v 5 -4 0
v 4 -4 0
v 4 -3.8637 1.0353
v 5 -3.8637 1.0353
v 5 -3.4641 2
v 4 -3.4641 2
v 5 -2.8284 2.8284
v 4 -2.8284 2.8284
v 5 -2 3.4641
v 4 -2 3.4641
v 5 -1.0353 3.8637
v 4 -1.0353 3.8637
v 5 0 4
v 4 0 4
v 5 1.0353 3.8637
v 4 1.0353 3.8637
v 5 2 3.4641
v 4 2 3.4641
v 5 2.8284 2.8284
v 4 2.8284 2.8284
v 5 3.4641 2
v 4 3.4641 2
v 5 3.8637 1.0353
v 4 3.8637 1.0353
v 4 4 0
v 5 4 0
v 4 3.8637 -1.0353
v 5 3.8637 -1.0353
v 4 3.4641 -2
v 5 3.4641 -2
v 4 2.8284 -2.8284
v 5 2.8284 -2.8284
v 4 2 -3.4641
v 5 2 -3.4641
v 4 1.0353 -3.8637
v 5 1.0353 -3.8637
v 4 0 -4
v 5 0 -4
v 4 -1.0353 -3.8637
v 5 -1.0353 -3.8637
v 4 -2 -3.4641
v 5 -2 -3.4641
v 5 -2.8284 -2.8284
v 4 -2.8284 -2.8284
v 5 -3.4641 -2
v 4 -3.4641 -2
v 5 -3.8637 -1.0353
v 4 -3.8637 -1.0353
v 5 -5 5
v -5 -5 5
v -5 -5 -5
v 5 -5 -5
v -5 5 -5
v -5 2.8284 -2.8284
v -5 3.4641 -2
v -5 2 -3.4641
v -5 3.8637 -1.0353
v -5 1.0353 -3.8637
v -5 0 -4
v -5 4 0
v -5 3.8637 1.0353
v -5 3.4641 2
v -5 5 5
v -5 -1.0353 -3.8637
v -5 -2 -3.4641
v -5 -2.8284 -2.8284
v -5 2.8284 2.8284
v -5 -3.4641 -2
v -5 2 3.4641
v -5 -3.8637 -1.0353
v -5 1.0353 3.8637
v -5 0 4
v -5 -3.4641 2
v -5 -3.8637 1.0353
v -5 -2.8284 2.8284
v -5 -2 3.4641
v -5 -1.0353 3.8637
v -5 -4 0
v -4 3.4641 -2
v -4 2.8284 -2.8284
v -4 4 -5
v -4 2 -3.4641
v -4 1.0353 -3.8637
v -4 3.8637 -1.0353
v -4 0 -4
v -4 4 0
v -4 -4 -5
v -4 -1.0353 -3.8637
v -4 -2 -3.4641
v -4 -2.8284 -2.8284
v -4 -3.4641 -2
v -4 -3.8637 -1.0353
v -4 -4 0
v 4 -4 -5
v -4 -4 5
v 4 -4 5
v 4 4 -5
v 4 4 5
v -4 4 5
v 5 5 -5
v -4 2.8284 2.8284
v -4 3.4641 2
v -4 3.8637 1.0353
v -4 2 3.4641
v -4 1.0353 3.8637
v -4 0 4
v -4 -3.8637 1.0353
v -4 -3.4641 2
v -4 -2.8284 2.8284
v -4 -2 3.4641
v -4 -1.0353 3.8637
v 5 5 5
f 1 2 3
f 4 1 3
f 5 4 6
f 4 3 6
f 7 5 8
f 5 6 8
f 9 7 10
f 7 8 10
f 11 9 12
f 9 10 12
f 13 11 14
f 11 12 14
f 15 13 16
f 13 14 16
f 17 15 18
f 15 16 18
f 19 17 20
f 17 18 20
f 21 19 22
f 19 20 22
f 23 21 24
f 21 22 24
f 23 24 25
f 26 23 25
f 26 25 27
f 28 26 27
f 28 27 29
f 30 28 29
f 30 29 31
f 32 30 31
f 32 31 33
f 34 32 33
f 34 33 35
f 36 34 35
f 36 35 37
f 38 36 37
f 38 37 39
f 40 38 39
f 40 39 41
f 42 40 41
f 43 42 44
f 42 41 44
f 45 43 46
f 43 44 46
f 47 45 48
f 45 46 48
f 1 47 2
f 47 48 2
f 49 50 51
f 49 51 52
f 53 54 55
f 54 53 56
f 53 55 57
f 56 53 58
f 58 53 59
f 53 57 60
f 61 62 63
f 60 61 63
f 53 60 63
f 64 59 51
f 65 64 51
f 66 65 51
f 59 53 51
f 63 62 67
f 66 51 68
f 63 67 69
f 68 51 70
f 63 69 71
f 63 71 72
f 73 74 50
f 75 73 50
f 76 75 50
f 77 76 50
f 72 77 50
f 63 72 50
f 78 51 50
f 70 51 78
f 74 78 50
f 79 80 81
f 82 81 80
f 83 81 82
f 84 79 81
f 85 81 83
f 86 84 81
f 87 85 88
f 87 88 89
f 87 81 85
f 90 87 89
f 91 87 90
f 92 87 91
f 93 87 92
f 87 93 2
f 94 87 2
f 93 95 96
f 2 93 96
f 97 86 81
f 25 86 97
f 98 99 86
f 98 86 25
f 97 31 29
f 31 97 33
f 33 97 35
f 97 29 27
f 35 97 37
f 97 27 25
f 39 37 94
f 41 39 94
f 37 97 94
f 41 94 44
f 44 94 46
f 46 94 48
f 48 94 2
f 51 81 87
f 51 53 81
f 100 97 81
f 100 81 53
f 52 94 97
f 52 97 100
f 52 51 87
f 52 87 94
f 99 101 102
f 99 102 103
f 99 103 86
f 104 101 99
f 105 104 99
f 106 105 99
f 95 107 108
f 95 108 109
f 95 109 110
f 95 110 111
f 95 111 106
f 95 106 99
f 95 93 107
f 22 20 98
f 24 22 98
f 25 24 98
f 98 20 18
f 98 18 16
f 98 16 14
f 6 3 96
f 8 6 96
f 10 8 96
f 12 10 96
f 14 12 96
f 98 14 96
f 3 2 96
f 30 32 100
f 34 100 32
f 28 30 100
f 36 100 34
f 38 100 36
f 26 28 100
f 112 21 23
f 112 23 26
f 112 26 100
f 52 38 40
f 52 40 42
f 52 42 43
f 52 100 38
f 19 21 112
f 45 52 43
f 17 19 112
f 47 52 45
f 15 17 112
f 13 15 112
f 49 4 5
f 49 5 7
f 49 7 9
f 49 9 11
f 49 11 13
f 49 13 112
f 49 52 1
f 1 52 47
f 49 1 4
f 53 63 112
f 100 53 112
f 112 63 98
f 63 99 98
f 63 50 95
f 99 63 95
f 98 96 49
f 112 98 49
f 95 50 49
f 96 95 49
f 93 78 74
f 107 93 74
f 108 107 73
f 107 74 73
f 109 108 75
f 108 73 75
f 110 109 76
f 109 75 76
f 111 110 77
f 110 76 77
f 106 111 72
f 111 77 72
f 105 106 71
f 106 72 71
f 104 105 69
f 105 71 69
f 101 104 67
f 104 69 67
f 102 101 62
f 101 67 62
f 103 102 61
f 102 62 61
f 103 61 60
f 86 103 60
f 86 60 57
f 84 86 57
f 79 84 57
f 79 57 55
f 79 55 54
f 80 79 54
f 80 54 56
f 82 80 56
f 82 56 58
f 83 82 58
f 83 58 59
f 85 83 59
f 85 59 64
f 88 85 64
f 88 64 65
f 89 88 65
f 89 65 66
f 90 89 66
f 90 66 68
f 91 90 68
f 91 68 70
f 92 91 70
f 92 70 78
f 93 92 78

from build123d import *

# Parameters (mm, degrees)
F0_W     = 10
F0_H     = 10
F1_DEPTH = 5
F2_T     = -1
F4_D     = 8
F5_D     = 8


with BuildPart() as f1:
    # F0 (on Front) → F1 (new body, symmetric)
    with BuildSketch(Plane.XZ):
        Rectangle(F0_W, F0_H)
    extrude(amount=F1_DEPTH, both=True)

    # F2
    f2_openings = [f1.faces().sort_by_distance(p)[0] for p in [
        (0, 0, 5),
        (0, 0, -5),
    ]]
    offset(amount=F2_T, openings=f2_openings)

    # F4 (through all)
    with Locations(Plane.YZ):
        with Locations((0, 0)):
            Hole(F4_D / 2)

    # F5 (through all)
    with Locations(Plane(origin=(0, 0, 0), x_dir=(0, 1, 0), z_dir=(-1, 0, 0))):
        with Locations((0, 0)):
            Hole(F5_D / 2)


solid = f1.part
